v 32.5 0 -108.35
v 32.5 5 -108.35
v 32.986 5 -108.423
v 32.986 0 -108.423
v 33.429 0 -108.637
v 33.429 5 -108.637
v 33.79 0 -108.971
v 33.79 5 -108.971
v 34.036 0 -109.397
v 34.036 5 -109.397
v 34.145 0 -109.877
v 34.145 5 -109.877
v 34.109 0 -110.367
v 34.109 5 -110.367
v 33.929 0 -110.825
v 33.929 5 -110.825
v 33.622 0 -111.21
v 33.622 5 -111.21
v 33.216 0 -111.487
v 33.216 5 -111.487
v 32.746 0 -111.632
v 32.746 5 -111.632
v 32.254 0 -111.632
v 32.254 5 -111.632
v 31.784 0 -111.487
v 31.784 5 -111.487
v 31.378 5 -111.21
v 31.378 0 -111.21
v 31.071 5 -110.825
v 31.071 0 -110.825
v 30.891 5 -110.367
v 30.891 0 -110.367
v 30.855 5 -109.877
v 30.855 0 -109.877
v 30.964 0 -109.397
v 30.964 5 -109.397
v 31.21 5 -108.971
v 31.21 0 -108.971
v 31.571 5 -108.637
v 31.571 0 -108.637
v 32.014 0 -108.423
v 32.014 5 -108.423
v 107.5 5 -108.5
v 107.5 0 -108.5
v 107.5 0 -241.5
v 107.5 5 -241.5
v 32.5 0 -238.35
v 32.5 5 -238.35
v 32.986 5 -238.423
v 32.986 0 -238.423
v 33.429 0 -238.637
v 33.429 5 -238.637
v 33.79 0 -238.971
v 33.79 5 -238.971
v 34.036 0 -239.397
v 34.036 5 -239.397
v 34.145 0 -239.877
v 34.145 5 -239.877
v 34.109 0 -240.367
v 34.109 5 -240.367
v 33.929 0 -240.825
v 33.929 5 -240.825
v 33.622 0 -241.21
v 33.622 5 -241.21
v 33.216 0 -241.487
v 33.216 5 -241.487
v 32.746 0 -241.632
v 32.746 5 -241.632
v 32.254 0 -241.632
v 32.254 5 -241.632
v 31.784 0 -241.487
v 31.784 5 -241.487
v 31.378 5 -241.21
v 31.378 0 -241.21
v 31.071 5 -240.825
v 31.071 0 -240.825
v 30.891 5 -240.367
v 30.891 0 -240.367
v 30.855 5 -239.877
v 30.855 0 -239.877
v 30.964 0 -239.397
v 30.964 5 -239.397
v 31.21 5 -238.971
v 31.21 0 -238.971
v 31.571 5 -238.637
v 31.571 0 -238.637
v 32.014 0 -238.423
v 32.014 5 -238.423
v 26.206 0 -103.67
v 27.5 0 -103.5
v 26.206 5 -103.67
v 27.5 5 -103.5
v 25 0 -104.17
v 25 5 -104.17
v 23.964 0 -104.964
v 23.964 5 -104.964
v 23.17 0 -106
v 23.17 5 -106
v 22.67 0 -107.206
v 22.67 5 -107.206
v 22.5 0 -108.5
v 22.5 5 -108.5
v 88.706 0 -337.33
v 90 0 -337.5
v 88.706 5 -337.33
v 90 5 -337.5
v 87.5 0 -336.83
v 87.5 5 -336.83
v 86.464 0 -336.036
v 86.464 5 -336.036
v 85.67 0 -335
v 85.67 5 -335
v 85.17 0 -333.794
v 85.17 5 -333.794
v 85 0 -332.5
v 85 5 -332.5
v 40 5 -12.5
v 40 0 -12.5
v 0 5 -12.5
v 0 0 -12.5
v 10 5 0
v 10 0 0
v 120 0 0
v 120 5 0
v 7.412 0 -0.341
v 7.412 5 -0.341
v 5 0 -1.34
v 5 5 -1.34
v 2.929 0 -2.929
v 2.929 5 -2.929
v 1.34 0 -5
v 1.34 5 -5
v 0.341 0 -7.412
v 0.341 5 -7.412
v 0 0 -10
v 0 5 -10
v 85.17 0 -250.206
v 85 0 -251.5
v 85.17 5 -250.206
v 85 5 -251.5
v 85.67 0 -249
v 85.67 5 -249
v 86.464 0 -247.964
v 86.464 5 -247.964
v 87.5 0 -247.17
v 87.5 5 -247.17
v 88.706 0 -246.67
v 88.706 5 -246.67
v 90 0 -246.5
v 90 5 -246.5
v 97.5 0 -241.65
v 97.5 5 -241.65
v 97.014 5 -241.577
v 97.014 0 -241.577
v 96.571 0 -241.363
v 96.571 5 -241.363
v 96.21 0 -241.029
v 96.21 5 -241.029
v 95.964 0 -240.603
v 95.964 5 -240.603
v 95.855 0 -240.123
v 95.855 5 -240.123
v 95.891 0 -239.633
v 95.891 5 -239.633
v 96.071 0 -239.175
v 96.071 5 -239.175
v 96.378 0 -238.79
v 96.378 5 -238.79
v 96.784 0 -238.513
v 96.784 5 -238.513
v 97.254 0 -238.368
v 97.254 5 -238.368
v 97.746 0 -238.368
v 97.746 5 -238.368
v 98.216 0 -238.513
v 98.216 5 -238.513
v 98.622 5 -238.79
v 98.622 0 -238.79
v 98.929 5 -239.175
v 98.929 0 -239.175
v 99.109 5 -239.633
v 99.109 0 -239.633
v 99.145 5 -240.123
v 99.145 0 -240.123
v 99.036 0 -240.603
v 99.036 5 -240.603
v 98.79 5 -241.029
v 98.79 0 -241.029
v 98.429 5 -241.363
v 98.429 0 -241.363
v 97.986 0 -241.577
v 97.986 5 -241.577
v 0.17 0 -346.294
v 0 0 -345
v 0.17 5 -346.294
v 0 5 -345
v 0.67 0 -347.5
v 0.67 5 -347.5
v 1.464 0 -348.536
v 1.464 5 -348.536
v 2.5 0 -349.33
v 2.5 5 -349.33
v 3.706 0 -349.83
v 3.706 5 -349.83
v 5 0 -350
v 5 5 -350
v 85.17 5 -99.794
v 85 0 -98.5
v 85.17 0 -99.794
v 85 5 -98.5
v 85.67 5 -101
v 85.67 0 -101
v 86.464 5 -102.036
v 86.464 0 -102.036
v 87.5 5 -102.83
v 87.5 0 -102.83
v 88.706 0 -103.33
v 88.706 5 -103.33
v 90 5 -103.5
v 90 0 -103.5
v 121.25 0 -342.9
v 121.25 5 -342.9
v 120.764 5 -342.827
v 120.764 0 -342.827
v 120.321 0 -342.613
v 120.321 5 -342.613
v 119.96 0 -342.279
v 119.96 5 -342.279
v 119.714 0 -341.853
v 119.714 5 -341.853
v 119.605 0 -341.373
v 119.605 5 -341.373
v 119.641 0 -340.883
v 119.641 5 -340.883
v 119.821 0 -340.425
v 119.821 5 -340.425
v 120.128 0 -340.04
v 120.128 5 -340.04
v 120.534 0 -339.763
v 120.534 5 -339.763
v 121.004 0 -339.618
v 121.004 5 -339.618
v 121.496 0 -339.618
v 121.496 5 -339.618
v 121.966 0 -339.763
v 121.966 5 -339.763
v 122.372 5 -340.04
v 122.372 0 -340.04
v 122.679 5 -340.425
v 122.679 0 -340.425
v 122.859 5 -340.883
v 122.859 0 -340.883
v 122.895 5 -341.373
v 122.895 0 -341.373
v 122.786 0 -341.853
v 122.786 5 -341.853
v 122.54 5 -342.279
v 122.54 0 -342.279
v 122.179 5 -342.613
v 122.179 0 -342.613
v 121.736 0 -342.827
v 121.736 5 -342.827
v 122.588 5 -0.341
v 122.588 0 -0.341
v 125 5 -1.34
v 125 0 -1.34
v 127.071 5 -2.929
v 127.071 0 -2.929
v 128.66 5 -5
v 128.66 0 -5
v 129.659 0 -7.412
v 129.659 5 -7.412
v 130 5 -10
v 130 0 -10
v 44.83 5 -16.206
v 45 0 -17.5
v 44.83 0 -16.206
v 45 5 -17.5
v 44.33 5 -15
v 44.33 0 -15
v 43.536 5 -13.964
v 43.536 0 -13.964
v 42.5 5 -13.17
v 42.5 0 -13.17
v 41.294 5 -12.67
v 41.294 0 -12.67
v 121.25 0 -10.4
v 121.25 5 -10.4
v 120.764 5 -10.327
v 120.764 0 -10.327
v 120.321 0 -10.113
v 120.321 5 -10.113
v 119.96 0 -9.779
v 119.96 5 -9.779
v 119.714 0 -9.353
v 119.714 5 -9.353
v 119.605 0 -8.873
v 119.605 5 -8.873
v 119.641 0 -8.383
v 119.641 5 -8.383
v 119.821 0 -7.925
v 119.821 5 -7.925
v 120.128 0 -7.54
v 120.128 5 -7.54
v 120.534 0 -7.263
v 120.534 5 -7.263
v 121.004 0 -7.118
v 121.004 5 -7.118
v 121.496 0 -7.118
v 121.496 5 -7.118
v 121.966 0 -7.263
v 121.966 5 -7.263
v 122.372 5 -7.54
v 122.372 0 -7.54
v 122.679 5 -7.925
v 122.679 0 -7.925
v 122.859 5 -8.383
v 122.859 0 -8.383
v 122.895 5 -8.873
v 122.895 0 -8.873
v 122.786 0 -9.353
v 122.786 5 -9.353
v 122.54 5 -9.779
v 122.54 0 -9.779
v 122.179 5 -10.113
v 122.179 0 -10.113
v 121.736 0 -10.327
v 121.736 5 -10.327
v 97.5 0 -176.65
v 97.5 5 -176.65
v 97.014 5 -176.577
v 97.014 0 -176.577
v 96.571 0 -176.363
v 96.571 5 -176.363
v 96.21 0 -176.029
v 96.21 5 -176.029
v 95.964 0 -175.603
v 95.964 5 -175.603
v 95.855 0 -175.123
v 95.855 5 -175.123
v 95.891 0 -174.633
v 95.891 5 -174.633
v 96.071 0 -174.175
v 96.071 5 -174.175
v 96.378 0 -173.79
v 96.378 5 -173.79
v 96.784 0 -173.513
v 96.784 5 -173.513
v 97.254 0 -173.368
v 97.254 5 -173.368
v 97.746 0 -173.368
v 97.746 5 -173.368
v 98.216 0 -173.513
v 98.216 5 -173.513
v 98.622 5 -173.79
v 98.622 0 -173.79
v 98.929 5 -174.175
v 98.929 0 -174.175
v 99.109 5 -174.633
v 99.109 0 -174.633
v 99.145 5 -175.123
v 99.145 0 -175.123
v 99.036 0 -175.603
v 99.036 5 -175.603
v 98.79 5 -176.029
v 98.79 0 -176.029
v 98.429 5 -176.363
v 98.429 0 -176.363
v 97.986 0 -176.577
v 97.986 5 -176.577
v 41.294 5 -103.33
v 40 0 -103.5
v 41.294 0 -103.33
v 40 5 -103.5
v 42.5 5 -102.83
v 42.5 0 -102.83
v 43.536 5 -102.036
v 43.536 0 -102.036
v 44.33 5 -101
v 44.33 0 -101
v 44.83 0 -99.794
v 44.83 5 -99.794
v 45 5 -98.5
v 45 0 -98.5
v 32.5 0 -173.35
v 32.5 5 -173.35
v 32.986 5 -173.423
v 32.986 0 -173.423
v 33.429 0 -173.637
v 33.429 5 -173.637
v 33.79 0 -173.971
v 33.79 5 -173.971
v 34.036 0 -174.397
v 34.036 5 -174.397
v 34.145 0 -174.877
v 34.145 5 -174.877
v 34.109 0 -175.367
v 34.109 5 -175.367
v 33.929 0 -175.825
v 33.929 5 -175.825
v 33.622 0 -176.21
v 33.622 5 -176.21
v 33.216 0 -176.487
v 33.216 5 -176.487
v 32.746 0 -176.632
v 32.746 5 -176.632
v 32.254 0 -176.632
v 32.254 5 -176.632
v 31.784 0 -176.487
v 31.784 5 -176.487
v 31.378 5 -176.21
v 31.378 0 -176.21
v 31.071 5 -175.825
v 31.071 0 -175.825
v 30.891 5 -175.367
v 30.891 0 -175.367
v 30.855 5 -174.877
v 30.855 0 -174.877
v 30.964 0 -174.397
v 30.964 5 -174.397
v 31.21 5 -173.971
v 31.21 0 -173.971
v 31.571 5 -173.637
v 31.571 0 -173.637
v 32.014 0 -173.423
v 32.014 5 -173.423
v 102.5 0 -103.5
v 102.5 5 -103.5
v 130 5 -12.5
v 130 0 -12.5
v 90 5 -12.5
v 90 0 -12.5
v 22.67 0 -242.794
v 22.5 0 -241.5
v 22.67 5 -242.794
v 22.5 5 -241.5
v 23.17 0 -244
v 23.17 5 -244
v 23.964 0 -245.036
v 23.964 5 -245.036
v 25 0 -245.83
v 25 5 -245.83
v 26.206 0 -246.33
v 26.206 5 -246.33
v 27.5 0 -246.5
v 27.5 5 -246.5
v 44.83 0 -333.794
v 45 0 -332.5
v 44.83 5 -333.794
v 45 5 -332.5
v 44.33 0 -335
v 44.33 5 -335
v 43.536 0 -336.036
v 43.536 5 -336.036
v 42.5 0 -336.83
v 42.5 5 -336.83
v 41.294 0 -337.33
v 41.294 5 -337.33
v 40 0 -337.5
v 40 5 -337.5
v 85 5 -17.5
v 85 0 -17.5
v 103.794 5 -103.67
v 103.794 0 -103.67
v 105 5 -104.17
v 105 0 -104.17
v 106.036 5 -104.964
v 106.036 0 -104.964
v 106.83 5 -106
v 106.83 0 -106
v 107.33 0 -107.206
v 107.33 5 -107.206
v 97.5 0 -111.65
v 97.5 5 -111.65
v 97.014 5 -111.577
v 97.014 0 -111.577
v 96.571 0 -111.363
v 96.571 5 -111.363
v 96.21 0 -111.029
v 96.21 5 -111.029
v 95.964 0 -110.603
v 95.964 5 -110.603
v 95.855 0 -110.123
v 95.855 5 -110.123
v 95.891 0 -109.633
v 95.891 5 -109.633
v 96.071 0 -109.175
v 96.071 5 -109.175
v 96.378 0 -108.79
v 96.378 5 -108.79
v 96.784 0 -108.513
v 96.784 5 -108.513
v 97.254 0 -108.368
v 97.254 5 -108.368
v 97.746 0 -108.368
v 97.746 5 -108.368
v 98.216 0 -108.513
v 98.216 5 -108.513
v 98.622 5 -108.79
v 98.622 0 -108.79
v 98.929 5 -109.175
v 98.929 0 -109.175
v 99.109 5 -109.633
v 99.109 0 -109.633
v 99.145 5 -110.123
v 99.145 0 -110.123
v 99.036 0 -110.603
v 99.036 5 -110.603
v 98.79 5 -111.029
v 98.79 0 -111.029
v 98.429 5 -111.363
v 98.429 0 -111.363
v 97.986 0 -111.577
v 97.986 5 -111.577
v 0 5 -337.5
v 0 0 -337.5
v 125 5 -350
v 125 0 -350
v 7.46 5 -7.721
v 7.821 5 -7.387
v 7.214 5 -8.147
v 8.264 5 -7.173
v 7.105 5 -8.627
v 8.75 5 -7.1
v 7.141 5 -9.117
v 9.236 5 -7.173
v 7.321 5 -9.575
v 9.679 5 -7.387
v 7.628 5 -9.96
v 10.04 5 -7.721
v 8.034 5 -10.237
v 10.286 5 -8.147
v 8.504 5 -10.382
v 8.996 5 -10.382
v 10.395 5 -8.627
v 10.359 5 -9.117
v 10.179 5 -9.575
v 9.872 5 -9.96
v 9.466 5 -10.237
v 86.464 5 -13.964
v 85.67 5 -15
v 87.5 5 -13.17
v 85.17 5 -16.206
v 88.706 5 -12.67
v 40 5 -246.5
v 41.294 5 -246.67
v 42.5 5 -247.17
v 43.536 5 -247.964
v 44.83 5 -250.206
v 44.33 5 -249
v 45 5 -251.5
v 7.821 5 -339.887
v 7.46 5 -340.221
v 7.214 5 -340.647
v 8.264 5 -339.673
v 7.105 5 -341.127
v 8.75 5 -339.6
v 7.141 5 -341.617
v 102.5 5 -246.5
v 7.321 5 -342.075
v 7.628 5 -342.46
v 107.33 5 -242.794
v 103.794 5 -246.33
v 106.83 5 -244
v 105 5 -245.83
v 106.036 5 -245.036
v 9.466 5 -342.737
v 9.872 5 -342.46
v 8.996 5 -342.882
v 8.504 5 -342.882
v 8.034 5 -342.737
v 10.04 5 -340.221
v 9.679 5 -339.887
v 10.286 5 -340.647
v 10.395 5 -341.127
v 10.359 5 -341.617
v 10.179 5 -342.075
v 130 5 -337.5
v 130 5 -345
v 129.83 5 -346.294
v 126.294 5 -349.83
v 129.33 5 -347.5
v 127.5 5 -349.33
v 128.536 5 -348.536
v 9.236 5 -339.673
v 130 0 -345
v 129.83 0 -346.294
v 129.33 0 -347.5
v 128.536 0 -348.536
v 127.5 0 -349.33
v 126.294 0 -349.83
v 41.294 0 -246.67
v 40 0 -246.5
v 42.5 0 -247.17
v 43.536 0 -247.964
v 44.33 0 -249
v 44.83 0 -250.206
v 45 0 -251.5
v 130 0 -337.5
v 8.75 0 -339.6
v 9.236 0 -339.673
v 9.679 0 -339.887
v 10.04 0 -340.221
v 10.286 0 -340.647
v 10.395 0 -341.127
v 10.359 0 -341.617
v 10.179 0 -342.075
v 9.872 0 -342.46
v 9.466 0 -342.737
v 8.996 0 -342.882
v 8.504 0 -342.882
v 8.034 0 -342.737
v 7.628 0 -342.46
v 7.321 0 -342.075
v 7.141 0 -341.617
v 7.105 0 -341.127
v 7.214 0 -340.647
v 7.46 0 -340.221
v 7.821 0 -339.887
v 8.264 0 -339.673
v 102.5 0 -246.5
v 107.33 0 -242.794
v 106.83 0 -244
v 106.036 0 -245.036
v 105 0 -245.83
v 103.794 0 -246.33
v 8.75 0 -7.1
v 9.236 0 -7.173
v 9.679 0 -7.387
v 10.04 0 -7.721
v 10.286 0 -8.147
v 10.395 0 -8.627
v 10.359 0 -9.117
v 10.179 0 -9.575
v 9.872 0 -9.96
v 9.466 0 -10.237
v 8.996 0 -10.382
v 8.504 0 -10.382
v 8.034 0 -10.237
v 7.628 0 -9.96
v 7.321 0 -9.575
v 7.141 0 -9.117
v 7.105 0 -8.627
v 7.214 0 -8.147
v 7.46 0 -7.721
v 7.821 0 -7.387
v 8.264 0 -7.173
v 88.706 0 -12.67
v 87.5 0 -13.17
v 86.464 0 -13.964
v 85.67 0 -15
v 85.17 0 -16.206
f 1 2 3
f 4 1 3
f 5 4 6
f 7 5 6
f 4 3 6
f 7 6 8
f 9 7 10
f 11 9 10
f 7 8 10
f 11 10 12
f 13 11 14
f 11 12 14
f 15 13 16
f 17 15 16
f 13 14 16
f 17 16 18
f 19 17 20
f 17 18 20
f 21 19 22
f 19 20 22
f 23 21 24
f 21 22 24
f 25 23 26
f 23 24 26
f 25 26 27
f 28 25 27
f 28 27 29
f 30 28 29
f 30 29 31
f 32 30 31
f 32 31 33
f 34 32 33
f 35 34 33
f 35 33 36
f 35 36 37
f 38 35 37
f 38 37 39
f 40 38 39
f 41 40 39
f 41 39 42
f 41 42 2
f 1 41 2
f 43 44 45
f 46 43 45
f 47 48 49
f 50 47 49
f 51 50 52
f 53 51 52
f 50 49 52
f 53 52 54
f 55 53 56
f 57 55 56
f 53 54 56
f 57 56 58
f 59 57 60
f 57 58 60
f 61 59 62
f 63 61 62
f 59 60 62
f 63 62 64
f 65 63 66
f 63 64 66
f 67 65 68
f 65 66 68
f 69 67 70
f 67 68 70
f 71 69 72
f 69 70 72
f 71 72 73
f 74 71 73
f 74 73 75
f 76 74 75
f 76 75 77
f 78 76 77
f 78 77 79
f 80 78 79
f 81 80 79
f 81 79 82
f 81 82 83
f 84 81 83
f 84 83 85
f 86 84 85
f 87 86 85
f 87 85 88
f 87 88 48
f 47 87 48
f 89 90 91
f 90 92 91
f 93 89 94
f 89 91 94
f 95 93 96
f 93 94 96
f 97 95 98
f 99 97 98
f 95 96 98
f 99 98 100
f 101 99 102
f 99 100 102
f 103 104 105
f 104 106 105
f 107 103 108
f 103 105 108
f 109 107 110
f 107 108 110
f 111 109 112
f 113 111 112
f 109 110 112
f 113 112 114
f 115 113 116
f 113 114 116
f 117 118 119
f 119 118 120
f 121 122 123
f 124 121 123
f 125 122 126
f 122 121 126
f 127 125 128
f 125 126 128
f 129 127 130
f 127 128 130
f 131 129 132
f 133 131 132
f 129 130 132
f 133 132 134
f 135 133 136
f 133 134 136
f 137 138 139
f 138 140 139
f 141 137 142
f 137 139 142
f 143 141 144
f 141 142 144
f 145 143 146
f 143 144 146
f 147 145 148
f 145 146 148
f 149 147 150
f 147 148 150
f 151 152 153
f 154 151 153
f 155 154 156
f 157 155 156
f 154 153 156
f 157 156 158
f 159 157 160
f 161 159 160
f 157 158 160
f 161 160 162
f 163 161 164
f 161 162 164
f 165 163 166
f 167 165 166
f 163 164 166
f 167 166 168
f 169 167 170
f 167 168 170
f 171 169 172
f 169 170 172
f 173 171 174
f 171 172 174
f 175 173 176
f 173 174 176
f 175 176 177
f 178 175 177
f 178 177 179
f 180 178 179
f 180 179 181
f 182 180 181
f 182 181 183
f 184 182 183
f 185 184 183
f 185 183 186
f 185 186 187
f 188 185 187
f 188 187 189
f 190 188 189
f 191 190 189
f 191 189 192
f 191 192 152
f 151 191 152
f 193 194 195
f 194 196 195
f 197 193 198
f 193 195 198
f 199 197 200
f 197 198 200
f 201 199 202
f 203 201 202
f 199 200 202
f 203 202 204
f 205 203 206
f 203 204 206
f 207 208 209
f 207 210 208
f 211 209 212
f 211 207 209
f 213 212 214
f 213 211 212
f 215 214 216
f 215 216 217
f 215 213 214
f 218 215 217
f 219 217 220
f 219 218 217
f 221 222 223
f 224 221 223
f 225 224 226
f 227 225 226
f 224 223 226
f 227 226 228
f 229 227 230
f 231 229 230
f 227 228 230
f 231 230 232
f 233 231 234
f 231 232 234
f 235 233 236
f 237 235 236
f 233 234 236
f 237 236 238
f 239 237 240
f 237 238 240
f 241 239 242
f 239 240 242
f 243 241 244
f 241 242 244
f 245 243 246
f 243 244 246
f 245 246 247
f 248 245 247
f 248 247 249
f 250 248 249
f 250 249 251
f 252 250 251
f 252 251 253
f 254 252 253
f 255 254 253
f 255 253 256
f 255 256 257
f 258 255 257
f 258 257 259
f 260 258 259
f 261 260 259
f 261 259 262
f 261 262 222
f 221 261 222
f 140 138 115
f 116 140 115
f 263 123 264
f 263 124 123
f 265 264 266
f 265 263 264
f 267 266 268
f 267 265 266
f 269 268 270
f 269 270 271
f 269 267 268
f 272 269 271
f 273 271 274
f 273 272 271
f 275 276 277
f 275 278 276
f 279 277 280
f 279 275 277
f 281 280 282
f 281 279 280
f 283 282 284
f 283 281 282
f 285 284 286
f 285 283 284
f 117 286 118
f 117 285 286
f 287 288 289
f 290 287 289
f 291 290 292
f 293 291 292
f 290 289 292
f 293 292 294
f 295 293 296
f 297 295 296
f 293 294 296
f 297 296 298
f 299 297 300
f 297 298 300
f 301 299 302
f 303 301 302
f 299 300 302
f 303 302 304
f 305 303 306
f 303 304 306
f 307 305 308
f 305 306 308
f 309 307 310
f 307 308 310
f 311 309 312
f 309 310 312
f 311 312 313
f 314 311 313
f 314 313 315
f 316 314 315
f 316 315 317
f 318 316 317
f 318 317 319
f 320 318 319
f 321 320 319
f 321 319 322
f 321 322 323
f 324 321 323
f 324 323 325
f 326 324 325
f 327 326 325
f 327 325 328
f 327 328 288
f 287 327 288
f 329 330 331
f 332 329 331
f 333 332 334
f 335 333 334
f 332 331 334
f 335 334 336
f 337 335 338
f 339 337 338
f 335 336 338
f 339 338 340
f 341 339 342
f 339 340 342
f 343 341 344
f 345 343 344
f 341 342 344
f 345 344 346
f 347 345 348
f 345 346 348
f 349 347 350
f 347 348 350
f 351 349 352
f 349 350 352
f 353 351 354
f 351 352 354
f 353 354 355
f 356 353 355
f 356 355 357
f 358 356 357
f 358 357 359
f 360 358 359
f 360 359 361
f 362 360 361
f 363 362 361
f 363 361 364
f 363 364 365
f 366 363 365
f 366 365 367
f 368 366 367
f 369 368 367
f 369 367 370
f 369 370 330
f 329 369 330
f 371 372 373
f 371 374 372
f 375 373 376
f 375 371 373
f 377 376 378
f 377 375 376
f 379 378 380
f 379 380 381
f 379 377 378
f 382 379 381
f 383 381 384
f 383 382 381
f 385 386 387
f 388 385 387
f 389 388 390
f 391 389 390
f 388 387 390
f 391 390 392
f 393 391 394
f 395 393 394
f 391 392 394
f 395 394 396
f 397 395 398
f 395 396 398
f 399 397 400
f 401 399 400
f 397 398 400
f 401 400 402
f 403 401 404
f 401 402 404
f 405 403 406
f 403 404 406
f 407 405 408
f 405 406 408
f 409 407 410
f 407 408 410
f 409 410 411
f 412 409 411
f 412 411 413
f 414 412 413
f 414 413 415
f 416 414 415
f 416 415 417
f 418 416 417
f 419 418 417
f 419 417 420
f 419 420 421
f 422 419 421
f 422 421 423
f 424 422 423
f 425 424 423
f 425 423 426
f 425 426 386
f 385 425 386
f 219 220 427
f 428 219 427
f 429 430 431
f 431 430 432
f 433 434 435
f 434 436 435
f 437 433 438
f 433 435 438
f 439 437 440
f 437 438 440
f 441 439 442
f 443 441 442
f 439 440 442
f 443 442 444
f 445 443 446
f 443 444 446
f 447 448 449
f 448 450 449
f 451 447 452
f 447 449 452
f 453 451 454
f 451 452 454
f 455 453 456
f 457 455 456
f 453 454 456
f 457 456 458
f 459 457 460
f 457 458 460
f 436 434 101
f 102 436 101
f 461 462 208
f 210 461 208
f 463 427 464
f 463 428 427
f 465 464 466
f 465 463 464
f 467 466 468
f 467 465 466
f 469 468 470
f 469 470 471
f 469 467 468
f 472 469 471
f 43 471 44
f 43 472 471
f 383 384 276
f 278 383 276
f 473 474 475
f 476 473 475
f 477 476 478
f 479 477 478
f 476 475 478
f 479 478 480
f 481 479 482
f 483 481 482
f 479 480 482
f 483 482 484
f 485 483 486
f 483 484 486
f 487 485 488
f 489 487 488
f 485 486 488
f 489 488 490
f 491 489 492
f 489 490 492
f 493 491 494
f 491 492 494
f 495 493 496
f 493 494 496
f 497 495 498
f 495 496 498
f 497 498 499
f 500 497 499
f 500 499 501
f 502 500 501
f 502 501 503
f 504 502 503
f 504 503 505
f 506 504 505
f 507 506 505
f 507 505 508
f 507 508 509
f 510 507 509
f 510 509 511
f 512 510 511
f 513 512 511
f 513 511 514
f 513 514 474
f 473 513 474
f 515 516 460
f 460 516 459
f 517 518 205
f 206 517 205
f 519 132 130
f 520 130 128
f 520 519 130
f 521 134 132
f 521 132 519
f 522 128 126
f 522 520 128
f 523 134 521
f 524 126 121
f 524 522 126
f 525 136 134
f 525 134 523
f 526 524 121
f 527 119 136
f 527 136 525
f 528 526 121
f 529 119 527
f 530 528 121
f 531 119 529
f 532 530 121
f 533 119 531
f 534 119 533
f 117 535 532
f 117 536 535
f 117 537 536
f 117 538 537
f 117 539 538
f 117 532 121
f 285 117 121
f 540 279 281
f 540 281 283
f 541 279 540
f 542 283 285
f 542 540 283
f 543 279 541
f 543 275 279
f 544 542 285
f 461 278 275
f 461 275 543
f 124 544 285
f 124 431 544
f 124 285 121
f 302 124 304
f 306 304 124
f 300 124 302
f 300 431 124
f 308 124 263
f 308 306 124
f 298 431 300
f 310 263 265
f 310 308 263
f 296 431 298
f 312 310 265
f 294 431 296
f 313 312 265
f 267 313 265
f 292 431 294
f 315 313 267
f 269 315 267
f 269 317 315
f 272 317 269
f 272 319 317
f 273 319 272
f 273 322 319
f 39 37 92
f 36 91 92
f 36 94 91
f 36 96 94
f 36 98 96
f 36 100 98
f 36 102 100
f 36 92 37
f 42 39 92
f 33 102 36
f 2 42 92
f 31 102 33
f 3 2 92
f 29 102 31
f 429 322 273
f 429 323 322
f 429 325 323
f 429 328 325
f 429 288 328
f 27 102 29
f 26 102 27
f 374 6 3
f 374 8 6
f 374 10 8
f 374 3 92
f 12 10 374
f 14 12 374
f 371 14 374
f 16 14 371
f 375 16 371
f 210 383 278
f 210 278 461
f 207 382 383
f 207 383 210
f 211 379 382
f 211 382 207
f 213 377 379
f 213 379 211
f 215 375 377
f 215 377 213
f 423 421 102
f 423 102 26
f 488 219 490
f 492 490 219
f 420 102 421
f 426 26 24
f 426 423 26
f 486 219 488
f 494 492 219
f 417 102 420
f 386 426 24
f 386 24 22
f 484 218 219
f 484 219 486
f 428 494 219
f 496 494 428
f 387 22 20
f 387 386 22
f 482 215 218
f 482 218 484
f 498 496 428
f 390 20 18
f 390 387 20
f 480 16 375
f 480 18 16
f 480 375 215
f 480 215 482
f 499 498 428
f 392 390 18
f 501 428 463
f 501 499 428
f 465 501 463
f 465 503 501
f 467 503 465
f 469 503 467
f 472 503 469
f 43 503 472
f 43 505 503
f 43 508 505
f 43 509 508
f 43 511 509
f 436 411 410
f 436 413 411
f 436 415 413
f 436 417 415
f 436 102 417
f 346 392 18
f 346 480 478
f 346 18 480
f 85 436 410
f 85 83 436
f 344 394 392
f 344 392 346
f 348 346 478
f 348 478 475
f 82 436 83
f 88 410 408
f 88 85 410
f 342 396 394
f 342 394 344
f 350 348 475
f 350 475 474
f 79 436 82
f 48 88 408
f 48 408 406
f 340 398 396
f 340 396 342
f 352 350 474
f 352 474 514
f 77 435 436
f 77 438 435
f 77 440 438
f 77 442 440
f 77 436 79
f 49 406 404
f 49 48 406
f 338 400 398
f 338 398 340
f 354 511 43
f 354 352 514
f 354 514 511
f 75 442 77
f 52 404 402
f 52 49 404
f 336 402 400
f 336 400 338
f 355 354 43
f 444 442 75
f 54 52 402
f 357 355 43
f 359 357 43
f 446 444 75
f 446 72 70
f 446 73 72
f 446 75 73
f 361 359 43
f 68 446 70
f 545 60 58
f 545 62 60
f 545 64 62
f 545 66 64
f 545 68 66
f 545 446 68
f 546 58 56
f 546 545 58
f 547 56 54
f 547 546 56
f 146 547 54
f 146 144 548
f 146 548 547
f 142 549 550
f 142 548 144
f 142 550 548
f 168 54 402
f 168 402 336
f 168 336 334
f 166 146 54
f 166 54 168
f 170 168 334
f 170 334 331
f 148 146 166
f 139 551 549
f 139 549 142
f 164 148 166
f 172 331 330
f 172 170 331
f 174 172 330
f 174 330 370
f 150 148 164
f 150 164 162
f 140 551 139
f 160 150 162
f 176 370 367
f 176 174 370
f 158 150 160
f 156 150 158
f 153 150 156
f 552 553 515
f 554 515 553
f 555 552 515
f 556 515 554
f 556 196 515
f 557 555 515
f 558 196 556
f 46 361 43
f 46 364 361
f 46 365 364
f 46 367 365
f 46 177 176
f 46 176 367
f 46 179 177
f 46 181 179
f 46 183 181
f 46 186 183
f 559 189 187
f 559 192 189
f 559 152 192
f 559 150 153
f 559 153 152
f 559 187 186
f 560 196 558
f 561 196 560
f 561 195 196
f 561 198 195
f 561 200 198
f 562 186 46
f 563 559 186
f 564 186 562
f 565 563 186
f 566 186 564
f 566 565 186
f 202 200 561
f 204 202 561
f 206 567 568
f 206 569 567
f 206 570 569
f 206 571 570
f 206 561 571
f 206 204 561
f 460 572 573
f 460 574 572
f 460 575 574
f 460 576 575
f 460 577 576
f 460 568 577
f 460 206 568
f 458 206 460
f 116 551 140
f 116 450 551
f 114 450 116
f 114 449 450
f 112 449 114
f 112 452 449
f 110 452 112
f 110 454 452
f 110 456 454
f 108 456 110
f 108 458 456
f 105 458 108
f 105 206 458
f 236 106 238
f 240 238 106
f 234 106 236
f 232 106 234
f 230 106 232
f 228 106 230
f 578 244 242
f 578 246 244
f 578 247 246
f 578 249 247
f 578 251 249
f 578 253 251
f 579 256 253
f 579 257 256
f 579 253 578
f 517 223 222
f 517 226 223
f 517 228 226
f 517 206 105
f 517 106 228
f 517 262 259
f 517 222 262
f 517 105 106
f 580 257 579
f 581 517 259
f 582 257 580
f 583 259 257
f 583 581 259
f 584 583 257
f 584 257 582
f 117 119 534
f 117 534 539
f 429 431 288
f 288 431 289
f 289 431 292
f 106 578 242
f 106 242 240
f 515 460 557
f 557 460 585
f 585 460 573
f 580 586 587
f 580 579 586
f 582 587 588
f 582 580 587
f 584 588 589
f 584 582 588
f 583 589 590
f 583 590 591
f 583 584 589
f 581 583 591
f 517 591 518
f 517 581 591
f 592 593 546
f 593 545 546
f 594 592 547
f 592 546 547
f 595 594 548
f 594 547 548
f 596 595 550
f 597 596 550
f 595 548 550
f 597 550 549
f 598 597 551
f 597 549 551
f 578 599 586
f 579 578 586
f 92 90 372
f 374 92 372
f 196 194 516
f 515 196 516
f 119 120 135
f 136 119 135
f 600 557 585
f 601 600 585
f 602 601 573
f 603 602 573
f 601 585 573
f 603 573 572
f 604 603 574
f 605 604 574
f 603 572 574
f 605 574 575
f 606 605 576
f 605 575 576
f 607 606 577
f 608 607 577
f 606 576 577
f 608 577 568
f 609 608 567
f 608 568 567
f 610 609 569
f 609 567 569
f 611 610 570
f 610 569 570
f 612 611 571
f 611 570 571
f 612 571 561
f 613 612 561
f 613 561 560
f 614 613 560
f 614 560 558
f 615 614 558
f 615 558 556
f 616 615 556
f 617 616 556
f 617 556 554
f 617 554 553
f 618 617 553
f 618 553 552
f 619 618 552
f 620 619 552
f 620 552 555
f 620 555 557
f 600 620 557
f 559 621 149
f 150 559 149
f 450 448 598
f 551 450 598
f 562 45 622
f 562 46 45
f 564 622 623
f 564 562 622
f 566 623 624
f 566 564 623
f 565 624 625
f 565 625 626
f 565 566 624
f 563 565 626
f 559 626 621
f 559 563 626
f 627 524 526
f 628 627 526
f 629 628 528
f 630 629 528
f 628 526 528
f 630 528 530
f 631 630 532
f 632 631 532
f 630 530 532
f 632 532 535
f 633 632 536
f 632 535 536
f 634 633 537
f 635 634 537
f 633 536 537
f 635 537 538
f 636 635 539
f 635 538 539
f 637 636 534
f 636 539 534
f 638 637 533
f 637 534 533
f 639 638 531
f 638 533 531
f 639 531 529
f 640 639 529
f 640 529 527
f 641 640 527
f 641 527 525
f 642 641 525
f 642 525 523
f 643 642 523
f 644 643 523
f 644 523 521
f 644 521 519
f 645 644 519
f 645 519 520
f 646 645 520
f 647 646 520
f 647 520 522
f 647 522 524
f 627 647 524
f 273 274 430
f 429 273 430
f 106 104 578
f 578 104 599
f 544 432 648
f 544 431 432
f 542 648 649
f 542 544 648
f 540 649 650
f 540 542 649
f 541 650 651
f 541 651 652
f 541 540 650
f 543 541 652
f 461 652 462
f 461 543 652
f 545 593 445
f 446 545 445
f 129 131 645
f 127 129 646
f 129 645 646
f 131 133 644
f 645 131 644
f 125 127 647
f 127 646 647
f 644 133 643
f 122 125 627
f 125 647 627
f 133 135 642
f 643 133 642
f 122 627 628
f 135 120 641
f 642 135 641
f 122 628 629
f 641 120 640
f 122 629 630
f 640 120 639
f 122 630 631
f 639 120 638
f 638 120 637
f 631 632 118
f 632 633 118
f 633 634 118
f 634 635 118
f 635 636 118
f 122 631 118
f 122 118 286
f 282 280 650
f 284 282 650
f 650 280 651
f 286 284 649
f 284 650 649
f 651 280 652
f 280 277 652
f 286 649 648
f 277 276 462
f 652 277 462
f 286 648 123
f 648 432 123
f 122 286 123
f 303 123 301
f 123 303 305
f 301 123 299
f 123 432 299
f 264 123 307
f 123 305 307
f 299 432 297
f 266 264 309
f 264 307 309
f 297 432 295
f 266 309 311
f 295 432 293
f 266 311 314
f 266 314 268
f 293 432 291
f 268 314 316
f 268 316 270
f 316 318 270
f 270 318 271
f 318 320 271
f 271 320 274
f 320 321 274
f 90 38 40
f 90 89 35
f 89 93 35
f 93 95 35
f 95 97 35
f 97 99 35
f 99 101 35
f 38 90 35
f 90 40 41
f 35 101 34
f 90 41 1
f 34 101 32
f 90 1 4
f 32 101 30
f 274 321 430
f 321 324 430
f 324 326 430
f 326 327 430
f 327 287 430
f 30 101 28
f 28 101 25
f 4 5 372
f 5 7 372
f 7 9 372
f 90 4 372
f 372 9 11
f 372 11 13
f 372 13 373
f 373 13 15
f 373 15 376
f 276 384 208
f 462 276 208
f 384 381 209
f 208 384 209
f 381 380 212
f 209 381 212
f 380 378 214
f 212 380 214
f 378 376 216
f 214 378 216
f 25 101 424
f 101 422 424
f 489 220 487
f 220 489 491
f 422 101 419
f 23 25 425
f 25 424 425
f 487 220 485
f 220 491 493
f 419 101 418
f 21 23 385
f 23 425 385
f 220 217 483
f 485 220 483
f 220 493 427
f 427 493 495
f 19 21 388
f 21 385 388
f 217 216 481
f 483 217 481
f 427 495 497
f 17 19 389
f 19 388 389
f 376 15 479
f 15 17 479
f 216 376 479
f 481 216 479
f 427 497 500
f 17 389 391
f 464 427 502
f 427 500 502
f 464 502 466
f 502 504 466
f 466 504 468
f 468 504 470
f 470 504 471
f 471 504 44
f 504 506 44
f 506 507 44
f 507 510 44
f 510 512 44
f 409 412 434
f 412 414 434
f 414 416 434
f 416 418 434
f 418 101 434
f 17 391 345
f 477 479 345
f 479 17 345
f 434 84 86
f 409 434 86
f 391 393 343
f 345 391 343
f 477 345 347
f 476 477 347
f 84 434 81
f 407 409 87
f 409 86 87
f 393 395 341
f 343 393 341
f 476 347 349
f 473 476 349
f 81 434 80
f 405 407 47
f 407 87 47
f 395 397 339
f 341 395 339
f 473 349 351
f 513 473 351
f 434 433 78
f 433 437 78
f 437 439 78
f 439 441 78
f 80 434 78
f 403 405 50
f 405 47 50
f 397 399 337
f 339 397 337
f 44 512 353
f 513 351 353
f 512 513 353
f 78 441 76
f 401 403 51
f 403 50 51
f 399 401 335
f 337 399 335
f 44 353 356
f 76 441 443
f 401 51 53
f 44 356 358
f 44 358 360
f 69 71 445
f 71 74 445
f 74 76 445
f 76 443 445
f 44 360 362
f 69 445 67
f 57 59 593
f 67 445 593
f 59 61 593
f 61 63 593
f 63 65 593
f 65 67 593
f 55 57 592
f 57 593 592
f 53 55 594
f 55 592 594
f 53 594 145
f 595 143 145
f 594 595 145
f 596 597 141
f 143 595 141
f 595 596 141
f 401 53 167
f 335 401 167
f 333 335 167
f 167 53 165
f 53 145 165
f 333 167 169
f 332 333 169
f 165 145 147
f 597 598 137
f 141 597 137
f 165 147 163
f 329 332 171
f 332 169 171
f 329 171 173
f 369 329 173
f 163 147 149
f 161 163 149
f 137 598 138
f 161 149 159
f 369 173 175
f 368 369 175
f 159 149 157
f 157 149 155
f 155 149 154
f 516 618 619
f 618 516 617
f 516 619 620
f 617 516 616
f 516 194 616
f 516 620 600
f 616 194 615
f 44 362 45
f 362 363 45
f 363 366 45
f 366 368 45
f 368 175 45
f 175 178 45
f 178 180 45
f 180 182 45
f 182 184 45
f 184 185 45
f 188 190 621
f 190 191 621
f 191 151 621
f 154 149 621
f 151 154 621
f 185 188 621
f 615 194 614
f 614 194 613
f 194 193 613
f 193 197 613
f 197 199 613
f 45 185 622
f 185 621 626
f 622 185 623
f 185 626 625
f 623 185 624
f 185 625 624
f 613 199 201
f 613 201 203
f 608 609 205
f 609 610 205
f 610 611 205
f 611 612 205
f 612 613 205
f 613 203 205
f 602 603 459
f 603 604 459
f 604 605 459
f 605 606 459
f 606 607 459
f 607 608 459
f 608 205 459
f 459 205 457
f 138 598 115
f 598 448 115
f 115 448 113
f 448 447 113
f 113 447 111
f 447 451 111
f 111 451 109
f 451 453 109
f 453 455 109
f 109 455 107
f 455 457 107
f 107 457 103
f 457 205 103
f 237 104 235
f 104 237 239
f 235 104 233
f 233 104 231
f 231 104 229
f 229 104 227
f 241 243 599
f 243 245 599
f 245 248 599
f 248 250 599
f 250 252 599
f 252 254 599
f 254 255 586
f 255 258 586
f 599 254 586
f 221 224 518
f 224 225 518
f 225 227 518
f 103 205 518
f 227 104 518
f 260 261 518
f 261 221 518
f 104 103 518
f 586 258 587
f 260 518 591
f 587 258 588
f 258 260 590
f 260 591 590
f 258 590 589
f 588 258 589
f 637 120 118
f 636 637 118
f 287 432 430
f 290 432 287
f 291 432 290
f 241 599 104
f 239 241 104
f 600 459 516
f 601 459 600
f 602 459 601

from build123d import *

# Parameters (mm, degrees)
BOSS_EXTRUDE1_DEPTH = 5
FILLET1_R           = 10
FILLET2_R           = 5
SKETCH2_R           = 1.65
CUT_EXTRUDE1_DEPTH  = 374.396572025
SKETCH3_R           = 1.65
CUT_EXTRUDE2_DEPTH  = 374.396572025
SKETCH4_R           = 1.65
CUT_EXTRUDE3_DEPTH  = 374.396572025
FILLET3_R           = 5


with BuildPart() as part:
    # Sketch1 → Boss-Extrude1 (new body)
    with BuildSketch(Plane(origin=(0, 0, 0), x_dir=(1, 0, 0), z_dir=(0, 1, 0))):
        Polygon((0, 0), (130, 0), (130, 12.5), (85, 12.5), (85, 103.5), (107.5, 103.5), (107.5, 246.5), (85, 246.5), (85, 337.5), (130, 337.5), (130, 350), (0, 350), (0, 337.5), (45, 337.5), (45, 246.5), (22.5, 246.5), (22.5, 103.5), (45, 103.5), (45, 12.5), (0, 12.5), align=None)
    extrude(amount=BOSS_EXTRUDE1_DEPTH)

    # Fillet1
    fillet1_edges = [part.edges().sort_by_distance(p)[0] for p in [
        (130, 2.5, 0),
        (0, 2.5, 0),
    ]]
    fillet(fillet1_edges, radius=FILLET1_R)

    # Fillet2
    fillet2_edges = [part.edges().sort_by_distance(p)[0] for p in [
        (22.5, 2.5, -103.5),
        (22.5, 2.5, -246.5),
        (0, 2.5, -350),
        (130, 2.5, -350),
        (107.5, 2.5, -246.5),
        (107.5, 2.5, -103.5),
    ]]
    fillet(fillet2_edges, radius=FILLET2_R)

    # Sketch2 → Cut-Extrude1 (cut, through all)
    with BuildSketch(Plane(origin=(0, 5, 0), x_dir=(1, 0, 0), z_dir=(0, 1, 0))):
        with Locations(Location((32.5, 240, 0), (0, 0, 270))):
            Circle(SKETCH2_R)
        with Locations(Location((32.5, 175, 0), (0, 0, 270))):
            Circle(SKETCH2_R)
        with Locations(Location((32.5, 110, 0), (0, 0, 270))):
            Circle(SKETCH2_R)
        with Locations(Location((97.5, 110, 0), (0, 0, 90))):
            Circle(SKETCH2_R)
        with Locations(Location((97.5, 175, 0), (0, 0, 90))):
            Circle(SKETCH2_R)
        with Locations(Location((97.5, 240, 0), (0, 0, 90))):
            Circle(SKETCH2_R)
    extrude(amount=-CUT_EXTRUDE1_DEPTH, mode=Mode.SUBTRACT)

    # Sketch3 → Cut-Extrude2 (cut, through all)
    with BuildSketch(Plane(origin=(0, 5, 0), x_dir=(1, 0, 0), z_dir=(0, 1, 0))):
        with Locations(Location((8.75, 8.75, 0), (0, 0, 270))):
            Circle(SKETCH3_R)
        with Locations(Location((121.25, 8.75, 0), (0, 0, 90))):
            Circle(SKETCH3_R)
    extrude(amount=-CUT_EXTRUDE2_DEPTH, mode=Mode.SUBTRACT)

    # Sketch4 → Cut-Extrude3 (cut, through all)
    with BuildSketch(Plane(origin=(0, 5, 0), x_dir=(1, 0, 0), z_dir=(0, 1, 0))):
        with Locations(Location((8.75, 341.25, 0), (0, 0, 270))):
            Circle(SKETCH4_R)
        with Locations(Location((121.25, 341.25, 0), (0, 0, 90))):
            Circle(SKETCH4_R)
    extrude(amount=-CUT_EXTRUDE3_DEPTH, mode=Mode.SUBTRACT)

    # Fillet3
    fillet3_edges = [part.edges().sort_by_distance(p)[0] for p in [
        (45, 2.5, -12.5),
        (45, 2.5, -103.5),
        (45, 2.5, -246.5),
        (45, 2.5, -337.5),
        (85, 2.5, -337.5),
        (85, 2.5, -246.5),
        (85, 2.5, -103.5),
        (85, 2.5, -12.5),
    ]]
    fillet(fillet3_edges, radius=FILLET3_R)


solid = part.part
